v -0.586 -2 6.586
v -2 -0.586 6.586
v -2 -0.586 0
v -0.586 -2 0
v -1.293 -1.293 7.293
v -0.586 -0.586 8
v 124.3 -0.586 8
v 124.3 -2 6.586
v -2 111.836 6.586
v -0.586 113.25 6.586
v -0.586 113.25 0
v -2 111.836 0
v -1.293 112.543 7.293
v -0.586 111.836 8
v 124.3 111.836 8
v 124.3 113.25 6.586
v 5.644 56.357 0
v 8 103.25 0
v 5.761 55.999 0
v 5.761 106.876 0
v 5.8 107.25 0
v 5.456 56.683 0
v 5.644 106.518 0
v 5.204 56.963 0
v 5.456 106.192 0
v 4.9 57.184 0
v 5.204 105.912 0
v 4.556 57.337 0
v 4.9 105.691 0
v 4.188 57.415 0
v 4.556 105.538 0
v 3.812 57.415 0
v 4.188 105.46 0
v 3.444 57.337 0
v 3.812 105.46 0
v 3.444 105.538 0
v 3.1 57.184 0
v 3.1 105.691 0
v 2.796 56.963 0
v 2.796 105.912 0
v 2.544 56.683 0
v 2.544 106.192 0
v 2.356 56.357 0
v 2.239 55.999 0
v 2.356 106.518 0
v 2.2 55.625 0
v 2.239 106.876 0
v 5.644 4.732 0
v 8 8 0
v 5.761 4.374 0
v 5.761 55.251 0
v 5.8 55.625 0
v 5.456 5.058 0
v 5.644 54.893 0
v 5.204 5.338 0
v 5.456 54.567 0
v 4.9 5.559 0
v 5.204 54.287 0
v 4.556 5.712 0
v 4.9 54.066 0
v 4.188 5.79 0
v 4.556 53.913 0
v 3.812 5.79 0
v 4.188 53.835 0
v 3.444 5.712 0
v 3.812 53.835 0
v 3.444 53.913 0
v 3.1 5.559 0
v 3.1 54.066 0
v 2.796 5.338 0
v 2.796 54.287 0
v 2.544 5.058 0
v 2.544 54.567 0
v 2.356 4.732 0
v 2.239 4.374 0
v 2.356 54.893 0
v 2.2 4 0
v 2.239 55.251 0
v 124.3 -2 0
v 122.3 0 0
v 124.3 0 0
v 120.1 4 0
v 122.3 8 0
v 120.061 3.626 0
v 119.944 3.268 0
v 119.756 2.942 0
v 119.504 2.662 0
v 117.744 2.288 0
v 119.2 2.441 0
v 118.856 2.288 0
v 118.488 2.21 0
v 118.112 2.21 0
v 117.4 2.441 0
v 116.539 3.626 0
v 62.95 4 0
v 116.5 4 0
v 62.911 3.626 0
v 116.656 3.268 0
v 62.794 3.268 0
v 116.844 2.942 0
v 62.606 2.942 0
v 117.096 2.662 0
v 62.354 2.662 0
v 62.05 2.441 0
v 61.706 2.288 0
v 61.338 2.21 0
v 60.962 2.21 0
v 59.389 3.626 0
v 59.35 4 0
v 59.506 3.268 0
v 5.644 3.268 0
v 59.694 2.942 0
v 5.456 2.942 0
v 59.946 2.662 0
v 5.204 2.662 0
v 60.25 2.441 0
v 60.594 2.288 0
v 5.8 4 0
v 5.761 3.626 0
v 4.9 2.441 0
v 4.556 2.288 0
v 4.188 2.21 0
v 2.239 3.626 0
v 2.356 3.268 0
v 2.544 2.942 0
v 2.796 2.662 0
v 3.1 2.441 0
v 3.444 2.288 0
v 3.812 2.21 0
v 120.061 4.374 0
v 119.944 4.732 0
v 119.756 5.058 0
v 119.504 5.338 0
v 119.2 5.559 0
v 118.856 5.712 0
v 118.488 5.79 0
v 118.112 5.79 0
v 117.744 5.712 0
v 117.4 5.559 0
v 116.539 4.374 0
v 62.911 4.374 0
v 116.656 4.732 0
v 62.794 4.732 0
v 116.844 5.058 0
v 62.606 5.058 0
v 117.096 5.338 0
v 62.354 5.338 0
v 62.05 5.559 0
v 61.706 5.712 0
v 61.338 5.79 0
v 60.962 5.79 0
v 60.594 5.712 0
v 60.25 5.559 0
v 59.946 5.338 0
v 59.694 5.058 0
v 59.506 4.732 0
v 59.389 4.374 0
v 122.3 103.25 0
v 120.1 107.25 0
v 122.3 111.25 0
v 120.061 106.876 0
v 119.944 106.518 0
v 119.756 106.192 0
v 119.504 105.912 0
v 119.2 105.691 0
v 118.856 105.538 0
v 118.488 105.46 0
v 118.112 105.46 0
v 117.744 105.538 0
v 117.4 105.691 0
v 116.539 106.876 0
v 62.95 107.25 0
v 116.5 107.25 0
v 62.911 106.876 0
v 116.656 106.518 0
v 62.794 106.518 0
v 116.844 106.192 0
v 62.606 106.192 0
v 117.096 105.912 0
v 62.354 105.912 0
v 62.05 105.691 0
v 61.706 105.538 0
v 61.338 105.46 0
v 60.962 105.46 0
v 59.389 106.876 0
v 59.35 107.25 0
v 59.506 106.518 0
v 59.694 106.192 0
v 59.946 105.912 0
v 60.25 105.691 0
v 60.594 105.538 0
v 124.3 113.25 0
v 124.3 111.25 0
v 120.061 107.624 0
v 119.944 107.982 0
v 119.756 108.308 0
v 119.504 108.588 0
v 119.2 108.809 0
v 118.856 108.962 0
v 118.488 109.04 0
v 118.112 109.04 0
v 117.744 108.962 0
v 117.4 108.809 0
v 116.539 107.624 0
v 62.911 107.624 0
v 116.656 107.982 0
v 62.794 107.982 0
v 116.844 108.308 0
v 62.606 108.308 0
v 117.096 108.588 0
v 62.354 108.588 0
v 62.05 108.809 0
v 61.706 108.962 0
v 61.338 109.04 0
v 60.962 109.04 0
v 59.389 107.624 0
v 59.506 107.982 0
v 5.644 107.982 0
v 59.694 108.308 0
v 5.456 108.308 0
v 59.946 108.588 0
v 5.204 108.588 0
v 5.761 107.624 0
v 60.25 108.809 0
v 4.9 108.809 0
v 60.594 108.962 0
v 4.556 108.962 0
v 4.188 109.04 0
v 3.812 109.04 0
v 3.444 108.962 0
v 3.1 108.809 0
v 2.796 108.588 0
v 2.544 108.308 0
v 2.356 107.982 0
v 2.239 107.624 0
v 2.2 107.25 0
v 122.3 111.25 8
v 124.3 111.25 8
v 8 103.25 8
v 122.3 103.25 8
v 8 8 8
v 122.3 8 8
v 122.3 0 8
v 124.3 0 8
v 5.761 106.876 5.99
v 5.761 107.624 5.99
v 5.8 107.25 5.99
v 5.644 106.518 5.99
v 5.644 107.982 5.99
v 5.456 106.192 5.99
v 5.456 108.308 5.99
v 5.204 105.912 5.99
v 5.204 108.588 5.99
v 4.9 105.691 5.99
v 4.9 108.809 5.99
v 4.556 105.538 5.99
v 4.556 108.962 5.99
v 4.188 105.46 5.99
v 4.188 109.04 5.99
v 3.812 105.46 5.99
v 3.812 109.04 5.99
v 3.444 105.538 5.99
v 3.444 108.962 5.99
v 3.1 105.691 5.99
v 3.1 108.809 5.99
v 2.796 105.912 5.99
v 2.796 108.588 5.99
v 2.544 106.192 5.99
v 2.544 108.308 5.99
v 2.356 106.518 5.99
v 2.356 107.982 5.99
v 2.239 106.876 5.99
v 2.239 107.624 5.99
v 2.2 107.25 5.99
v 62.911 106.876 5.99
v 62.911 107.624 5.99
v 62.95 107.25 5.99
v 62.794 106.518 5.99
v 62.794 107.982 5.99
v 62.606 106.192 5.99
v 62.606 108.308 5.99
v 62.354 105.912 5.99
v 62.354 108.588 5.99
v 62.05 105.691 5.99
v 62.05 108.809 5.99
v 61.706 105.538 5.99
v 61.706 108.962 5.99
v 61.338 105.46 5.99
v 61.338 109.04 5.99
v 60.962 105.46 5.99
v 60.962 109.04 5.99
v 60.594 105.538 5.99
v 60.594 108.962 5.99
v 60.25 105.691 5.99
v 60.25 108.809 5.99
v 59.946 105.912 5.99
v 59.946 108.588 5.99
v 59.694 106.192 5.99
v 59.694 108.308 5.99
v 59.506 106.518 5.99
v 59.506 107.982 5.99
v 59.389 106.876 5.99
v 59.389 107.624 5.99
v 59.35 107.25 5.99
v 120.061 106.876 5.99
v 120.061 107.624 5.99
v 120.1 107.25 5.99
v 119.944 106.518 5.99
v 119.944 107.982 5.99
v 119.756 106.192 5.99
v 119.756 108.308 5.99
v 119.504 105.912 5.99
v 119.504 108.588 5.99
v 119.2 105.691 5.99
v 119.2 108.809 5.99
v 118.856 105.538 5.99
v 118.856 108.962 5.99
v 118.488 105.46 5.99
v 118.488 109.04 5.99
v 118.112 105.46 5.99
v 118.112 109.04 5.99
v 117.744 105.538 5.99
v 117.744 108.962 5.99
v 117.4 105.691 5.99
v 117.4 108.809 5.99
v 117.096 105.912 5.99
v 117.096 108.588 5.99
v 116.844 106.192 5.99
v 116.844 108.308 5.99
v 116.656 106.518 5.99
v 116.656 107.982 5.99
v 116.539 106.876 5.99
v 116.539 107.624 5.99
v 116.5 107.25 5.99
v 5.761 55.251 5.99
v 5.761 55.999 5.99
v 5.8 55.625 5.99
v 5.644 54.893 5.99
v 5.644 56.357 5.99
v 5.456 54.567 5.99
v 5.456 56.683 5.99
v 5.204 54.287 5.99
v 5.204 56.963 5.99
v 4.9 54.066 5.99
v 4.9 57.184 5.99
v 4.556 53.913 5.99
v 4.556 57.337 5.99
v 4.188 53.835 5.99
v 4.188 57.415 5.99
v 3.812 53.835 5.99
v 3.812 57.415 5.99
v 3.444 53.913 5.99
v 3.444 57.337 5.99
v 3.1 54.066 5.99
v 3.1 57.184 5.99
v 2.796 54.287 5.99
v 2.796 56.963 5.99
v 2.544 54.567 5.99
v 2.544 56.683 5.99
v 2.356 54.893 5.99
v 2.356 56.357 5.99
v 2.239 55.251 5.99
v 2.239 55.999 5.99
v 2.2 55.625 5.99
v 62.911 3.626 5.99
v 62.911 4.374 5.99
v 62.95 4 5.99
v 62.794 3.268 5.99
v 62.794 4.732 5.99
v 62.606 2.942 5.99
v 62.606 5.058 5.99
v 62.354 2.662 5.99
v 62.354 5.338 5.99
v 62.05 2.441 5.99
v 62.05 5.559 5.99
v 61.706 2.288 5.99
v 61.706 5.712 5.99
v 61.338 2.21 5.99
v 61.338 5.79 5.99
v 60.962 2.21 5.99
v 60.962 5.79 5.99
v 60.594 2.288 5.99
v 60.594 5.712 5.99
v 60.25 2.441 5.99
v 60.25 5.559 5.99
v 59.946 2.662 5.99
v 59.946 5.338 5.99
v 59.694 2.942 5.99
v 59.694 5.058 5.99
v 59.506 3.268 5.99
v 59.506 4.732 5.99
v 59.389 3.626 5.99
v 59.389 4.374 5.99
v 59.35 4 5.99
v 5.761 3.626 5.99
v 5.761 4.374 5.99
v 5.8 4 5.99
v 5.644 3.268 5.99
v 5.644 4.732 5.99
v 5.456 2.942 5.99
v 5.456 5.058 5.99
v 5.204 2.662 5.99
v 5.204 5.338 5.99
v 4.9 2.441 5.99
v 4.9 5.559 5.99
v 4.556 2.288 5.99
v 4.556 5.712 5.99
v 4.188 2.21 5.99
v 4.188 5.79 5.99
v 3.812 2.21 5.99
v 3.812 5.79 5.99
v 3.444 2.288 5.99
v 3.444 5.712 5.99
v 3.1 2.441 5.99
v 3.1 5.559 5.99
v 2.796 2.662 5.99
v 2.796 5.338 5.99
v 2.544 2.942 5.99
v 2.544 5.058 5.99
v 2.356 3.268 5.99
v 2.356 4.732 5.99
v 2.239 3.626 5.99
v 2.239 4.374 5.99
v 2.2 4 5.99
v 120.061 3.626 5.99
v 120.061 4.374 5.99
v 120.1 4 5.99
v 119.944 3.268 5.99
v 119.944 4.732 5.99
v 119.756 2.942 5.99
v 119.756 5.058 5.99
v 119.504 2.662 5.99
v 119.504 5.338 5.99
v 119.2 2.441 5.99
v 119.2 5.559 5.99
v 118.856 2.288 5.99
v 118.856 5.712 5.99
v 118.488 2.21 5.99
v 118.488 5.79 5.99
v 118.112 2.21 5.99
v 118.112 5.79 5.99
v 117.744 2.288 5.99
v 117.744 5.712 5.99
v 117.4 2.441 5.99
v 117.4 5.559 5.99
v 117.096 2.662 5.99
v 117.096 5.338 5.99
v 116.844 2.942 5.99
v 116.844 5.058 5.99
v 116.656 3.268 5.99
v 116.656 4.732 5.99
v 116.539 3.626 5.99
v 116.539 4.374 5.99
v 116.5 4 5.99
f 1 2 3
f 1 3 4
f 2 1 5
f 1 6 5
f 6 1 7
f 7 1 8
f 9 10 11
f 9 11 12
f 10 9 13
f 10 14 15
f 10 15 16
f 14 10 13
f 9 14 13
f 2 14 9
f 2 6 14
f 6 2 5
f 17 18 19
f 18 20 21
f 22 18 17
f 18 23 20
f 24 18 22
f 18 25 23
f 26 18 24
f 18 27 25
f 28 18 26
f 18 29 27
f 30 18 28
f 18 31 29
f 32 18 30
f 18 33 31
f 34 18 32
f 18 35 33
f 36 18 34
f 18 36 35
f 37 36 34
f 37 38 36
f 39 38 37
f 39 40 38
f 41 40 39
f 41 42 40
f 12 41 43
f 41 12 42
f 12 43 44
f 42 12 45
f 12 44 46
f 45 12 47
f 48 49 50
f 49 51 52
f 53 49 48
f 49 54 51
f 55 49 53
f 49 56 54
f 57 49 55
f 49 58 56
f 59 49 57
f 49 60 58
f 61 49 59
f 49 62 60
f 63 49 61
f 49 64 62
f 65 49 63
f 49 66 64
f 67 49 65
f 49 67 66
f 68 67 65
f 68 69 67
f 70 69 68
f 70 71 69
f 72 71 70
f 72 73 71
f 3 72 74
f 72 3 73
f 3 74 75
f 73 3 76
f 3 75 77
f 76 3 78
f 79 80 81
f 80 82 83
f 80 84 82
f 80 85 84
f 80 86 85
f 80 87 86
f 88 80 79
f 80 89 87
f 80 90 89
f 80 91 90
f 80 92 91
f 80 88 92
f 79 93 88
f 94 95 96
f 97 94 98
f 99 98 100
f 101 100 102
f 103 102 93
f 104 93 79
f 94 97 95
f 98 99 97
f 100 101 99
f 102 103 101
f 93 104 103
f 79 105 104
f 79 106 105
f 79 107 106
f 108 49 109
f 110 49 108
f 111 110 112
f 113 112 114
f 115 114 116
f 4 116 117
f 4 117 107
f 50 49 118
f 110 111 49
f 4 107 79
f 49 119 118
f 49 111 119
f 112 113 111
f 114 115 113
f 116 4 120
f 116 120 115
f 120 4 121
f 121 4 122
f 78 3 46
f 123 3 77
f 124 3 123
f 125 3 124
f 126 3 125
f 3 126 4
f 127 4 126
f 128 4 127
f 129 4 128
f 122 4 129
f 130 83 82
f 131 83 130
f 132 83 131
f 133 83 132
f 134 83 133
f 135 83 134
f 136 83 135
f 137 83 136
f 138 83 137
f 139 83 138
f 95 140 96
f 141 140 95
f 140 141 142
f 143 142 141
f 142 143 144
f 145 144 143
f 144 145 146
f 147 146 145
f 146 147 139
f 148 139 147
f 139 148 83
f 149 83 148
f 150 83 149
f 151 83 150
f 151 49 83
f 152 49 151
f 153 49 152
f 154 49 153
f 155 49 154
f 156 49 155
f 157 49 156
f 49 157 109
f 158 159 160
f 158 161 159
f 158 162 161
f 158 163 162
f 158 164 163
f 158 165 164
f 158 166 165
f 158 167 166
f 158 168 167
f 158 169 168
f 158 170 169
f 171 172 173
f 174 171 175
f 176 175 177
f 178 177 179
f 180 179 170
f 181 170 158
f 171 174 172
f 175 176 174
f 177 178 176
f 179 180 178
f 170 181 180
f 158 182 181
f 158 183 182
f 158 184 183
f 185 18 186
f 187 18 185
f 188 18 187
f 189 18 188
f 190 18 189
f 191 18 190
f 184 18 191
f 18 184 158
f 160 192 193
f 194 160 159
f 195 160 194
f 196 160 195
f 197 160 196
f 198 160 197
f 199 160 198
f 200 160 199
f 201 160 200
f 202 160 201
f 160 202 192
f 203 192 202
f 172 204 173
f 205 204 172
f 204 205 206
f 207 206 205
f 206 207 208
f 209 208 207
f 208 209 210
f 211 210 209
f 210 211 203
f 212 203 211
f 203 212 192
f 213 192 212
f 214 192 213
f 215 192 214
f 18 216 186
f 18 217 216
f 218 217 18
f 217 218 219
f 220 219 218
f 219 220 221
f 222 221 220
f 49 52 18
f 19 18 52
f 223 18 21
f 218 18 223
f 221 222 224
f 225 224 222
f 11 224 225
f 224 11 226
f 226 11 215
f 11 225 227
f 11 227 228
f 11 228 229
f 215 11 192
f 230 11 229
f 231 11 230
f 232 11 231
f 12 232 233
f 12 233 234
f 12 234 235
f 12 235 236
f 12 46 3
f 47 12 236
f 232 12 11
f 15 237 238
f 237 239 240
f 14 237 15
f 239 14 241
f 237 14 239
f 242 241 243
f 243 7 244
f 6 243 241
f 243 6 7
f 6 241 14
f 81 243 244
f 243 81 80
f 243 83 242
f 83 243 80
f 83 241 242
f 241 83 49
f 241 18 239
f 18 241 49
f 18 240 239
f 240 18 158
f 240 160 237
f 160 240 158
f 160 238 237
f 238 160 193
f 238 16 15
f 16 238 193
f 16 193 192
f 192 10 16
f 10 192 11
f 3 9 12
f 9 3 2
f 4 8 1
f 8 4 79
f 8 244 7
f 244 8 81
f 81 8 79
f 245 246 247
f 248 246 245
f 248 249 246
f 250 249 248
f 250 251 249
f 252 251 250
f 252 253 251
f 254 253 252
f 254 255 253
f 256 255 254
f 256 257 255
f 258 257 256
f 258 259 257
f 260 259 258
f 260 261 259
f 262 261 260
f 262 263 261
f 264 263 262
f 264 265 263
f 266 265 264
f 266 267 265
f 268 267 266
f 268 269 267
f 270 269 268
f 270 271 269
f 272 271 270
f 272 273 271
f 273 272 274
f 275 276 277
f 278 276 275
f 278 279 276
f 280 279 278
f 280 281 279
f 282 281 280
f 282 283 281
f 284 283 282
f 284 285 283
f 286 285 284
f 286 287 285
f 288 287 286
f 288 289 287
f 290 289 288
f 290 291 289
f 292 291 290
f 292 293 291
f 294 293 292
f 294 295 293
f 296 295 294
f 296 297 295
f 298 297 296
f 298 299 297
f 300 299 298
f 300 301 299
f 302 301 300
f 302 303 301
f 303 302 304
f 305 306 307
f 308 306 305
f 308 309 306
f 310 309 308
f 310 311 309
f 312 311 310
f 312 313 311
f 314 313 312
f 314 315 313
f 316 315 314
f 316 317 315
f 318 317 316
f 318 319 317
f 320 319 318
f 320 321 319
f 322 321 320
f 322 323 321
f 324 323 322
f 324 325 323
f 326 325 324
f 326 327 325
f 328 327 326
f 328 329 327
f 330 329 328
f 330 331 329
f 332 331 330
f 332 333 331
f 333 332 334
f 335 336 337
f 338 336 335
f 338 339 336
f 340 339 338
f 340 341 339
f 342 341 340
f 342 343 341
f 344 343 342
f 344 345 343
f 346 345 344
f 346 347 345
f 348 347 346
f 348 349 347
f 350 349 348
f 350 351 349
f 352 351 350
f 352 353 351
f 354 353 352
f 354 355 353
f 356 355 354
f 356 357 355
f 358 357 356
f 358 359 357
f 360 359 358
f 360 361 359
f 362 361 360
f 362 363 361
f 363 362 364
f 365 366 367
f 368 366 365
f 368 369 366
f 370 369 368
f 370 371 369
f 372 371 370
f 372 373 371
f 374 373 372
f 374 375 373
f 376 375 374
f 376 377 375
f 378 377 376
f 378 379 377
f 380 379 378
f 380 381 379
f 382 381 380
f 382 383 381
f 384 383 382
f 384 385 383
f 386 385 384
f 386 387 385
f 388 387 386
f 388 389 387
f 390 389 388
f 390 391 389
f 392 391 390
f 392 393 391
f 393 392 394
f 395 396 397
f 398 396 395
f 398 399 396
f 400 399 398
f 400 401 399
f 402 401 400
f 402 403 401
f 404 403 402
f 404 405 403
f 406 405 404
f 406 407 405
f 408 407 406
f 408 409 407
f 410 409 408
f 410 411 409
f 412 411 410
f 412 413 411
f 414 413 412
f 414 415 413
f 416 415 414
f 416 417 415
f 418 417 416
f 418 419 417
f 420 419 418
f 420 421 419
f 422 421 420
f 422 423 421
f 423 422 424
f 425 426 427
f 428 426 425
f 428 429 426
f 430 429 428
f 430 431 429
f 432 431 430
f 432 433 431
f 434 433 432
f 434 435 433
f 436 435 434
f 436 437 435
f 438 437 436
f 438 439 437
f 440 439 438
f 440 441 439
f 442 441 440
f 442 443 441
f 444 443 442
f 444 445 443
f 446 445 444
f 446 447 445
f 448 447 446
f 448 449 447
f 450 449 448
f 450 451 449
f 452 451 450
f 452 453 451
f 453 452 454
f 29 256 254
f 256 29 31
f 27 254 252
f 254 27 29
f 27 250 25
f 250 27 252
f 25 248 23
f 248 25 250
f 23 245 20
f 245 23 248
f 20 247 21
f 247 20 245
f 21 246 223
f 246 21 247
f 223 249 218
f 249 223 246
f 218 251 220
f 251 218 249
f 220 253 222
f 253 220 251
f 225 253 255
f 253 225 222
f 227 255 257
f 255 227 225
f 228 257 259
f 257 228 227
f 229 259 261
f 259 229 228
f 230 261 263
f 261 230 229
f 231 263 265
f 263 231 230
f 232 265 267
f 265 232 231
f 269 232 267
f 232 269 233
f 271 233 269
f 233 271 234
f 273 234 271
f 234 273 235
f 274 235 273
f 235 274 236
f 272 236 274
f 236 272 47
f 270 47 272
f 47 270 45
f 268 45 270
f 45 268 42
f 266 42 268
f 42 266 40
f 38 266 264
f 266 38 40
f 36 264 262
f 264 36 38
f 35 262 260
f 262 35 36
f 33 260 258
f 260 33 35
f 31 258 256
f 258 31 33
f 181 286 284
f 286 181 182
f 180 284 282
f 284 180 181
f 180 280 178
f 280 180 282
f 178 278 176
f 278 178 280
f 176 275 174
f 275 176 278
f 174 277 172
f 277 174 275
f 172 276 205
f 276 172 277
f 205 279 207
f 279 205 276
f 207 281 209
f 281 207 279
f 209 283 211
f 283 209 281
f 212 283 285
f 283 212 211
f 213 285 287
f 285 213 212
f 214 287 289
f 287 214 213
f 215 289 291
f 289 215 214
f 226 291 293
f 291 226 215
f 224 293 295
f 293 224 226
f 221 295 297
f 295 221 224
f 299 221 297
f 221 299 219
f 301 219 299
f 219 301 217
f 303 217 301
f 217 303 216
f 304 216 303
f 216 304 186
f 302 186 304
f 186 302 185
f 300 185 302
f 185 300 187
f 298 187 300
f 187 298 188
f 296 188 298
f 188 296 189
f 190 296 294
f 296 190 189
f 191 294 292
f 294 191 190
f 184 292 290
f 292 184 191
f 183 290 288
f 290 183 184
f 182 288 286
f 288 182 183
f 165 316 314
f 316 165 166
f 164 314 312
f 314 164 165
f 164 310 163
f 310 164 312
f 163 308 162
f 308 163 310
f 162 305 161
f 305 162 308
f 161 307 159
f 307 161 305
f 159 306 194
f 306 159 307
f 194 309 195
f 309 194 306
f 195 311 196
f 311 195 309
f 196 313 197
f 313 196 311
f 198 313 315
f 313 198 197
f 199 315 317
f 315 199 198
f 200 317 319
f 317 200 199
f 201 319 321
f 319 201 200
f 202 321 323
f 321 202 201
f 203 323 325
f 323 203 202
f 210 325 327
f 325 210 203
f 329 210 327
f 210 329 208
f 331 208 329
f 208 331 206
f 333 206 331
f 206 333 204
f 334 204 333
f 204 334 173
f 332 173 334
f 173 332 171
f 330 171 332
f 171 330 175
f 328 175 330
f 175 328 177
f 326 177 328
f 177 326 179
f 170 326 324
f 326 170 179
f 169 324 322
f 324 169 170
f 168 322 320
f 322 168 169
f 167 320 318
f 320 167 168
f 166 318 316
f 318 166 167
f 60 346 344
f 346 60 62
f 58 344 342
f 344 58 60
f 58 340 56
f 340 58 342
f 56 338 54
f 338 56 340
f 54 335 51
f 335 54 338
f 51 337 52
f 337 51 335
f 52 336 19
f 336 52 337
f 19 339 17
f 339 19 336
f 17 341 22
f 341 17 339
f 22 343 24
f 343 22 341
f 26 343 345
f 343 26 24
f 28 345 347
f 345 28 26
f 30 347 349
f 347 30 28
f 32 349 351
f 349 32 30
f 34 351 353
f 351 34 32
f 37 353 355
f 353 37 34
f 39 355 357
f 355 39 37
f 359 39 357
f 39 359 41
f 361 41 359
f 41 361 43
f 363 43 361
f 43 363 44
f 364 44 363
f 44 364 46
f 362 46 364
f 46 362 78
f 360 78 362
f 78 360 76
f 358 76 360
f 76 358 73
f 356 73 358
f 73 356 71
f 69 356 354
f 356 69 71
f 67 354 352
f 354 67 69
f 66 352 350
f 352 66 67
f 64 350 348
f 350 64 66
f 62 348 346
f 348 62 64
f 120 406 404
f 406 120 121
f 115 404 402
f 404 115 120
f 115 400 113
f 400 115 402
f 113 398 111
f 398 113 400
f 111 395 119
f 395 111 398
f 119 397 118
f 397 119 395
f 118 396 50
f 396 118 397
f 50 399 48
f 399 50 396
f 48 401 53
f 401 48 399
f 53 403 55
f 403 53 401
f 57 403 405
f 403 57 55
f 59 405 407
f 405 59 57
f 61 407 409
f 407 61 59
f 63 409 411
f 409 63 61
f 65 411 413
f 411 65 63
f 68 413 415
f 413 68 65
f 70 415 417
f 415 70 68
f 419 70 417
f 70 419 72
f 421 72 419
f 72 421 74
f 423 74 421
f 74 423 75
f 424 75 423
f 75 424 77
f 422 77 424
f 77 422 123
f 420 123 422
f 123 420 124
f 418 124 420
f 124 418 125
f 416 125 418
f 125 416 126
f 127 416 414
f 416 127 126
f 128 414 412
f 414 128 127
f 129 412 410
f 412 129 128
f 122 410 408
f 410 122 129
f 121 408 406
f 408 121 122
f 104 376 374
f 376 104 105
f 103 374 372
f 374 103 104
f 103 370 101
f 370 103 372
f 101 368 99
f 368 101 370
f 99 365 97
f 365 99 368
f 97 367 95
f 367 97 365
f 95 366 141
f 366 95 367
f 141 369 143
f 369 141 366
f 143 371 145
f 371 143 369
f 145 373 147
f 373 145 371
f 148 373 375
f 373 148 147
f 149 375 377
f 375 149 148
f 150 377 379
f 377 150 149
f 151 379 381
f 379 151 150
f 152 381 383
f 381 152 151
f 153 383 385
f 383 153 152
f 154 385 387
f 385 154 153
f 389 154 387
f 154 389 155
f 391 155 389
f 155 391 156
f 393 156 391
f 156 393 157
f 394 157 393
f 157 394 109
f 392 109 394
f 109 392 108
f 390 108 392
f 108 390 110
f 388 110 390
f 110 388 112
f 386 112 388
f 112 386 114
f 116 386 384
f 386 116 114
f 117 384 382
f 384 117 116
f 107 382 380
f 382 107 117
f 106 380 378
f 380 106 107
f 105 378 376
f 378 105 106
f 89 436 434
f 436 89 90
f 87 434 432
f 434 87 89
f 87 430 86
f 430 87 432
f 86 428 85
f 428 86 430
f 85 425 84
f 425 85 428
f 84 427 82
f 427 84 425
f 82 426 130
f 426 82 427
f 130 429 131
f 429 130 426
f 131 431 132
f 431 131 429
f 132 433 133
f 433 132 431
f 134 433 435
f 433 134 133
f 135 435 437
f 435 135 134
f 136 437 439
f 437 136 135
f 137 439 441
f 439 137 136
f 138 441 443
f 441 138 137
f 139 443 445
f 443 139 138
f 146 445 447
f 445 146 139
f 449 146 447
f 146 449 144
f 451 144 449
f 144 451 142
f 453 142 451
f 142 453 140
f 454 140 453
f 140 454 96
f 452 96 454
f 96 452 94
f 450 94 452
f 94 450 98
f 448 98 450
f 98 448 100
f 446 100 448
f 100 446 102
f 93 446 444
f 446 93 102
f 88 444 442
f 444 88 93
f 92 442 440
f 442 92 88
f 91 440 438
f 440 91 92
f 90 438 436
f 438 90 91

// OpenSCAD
// file: mounting.scad
include <vars.scad>

module m2(position) {
    translate(position)
        circle(1.1 * mm);
}

module m2_insert(position) {
    translate(position)
        circle(1.8 * mm);
}

module mx_1u() {
    square(14 * mm, center=true);
}
// file: rounded_square.scad
module rounded_square(size,radius) {
    hull() {
        translate([radius, radius])
            circle(radius);
        translate([size.x - radius, radius])
            circle(radius);
        translate([radius, size.y - radius])
            circle(radius);
        translate([size.x - radius, size.y - radius])
            circle(radius);
    }
}
// file: vars.scad
$fs = 0.1;

mm = 1.0;
inch = 25.4;

rows = 5;
board_cols = 15;
hand_cols = 6;
center_cols = board_cols - 2 * hand_cols;

key_width = 0.75 * inch;
key_height = 0.75 * inch;

keyway_height = key_height * rows;
board_keyway_width = key_width * board_cols;
hand_keyway_width = key_width * hand_cols;
center_cover_width = key_width * center_cols;

plate_margin = 8 * mm;

plate_height = keyway_height + 2 * plate_margin;
board_plate_width = board_keyway_width + 2 * plate_margin;
hand_plate_width = hand_keyway_width + plate_margin; // margin only on outer edge

plate_corner_radius = 2 * mm;

mount_bottom = 0.5 * plate_margin;
mount_vcenter = 0.5 * plate_height;
mount_top = plate_height - 0.5 * plate_margin;

mount_left = 0.5 * plate_margin;
mount_hand_hcenter = 0.5 * hand_plate_width;
mount_hand_right = hand_plate_width - 0.5 * plate_margin;
mount_board_hcenter = 0.5 * board_plate_width;
mount_board_right = board_plate_width - 0.5 * plate_margin;

plate_thickness = 3 * mm;
case_depth = 10 * mm;

plate_color = [ 0, 0, 0, 0.2 ]; // rgba

center_cover_mounting_inset = 0.15 * inch;

case_overhang = 2 * mm;
hand_case_width = hand_plate_width + case_overhang;
case_height = plate_height + 2 * case_overhang;
top_shell_height = 8 * mm;
thread_depth = 6 * mm;
shell_chamfer = 2 * mm;
middle_shell_standoff_height = 8 * mm;
middle_shell_total_height = middle_shell_standoff_height + plate_thickness;
shell_center_lip = 2 * mm;
// main file
include <vars.scad>

use <rounded_square.scad>
use <mounting.scad>

module top_shell()
{
	difference()
	{
		// Base shape
		linear_extrude(top_shell_height) difference()
		{
			translate([ -case_overhang, -case_overhang ])
			square([ hand_case_width + shell_center_lip, case_height ]);

			translate([ plate_margin, plate_margin ])
			square([ hand_keyway_width, keyway_height ]);

			translate([ hand_plate_width, 0 ])
			square([ shell_center_lip, plate_height ]);
		}

		// Threaded inserts to line up with switch plate
		translate([ 0, 0, -0.01 * mm ])
		linear_extrude(thread_depth)
		{
			m2_insert([ mount_left, mount_bottom ]);
			m2_insert([ mount_hand_hcenter, mount_bottom ]);
			m2_insert([ mount_hand_right, mount_bottom ]);
			m2_insert([ mount_left, mount_vcenter ]);
			m2_insert([ mount_left, mount_top ]);
			m2_insert([ mount_hand_hcenter, mount_top ]);
			m2_insert([ mount_hand_right, mount_top ]);
		}

		// Chamfer edges
		translate([ -case_overhang, -case_overhang ])
		{
			for (i = [0:1])
			{
				translate([ 0, i * case_height, 0 ])
				rotate([ 0, 0, 45 ])
				cube([ shell_chamfer, shell_chamfer, top_shell_height * 2.1 ], center = true);

				translate([ 0, i * case_height, top_shell_height ])
				rotate([ 45, 0, 0 ])
				cube([ hand_plate_width * 2.1, shell_chamfer, shell_chamfer ], center = true);
			}

			translate([ 0, 0, top_shell_height ])
			rotate([ 0, 45, 0 ])
			cube([ shell_chamfer, case_height * 2.1, shell_chamfer ], center = true);
		}
	}
}

top_shell();
